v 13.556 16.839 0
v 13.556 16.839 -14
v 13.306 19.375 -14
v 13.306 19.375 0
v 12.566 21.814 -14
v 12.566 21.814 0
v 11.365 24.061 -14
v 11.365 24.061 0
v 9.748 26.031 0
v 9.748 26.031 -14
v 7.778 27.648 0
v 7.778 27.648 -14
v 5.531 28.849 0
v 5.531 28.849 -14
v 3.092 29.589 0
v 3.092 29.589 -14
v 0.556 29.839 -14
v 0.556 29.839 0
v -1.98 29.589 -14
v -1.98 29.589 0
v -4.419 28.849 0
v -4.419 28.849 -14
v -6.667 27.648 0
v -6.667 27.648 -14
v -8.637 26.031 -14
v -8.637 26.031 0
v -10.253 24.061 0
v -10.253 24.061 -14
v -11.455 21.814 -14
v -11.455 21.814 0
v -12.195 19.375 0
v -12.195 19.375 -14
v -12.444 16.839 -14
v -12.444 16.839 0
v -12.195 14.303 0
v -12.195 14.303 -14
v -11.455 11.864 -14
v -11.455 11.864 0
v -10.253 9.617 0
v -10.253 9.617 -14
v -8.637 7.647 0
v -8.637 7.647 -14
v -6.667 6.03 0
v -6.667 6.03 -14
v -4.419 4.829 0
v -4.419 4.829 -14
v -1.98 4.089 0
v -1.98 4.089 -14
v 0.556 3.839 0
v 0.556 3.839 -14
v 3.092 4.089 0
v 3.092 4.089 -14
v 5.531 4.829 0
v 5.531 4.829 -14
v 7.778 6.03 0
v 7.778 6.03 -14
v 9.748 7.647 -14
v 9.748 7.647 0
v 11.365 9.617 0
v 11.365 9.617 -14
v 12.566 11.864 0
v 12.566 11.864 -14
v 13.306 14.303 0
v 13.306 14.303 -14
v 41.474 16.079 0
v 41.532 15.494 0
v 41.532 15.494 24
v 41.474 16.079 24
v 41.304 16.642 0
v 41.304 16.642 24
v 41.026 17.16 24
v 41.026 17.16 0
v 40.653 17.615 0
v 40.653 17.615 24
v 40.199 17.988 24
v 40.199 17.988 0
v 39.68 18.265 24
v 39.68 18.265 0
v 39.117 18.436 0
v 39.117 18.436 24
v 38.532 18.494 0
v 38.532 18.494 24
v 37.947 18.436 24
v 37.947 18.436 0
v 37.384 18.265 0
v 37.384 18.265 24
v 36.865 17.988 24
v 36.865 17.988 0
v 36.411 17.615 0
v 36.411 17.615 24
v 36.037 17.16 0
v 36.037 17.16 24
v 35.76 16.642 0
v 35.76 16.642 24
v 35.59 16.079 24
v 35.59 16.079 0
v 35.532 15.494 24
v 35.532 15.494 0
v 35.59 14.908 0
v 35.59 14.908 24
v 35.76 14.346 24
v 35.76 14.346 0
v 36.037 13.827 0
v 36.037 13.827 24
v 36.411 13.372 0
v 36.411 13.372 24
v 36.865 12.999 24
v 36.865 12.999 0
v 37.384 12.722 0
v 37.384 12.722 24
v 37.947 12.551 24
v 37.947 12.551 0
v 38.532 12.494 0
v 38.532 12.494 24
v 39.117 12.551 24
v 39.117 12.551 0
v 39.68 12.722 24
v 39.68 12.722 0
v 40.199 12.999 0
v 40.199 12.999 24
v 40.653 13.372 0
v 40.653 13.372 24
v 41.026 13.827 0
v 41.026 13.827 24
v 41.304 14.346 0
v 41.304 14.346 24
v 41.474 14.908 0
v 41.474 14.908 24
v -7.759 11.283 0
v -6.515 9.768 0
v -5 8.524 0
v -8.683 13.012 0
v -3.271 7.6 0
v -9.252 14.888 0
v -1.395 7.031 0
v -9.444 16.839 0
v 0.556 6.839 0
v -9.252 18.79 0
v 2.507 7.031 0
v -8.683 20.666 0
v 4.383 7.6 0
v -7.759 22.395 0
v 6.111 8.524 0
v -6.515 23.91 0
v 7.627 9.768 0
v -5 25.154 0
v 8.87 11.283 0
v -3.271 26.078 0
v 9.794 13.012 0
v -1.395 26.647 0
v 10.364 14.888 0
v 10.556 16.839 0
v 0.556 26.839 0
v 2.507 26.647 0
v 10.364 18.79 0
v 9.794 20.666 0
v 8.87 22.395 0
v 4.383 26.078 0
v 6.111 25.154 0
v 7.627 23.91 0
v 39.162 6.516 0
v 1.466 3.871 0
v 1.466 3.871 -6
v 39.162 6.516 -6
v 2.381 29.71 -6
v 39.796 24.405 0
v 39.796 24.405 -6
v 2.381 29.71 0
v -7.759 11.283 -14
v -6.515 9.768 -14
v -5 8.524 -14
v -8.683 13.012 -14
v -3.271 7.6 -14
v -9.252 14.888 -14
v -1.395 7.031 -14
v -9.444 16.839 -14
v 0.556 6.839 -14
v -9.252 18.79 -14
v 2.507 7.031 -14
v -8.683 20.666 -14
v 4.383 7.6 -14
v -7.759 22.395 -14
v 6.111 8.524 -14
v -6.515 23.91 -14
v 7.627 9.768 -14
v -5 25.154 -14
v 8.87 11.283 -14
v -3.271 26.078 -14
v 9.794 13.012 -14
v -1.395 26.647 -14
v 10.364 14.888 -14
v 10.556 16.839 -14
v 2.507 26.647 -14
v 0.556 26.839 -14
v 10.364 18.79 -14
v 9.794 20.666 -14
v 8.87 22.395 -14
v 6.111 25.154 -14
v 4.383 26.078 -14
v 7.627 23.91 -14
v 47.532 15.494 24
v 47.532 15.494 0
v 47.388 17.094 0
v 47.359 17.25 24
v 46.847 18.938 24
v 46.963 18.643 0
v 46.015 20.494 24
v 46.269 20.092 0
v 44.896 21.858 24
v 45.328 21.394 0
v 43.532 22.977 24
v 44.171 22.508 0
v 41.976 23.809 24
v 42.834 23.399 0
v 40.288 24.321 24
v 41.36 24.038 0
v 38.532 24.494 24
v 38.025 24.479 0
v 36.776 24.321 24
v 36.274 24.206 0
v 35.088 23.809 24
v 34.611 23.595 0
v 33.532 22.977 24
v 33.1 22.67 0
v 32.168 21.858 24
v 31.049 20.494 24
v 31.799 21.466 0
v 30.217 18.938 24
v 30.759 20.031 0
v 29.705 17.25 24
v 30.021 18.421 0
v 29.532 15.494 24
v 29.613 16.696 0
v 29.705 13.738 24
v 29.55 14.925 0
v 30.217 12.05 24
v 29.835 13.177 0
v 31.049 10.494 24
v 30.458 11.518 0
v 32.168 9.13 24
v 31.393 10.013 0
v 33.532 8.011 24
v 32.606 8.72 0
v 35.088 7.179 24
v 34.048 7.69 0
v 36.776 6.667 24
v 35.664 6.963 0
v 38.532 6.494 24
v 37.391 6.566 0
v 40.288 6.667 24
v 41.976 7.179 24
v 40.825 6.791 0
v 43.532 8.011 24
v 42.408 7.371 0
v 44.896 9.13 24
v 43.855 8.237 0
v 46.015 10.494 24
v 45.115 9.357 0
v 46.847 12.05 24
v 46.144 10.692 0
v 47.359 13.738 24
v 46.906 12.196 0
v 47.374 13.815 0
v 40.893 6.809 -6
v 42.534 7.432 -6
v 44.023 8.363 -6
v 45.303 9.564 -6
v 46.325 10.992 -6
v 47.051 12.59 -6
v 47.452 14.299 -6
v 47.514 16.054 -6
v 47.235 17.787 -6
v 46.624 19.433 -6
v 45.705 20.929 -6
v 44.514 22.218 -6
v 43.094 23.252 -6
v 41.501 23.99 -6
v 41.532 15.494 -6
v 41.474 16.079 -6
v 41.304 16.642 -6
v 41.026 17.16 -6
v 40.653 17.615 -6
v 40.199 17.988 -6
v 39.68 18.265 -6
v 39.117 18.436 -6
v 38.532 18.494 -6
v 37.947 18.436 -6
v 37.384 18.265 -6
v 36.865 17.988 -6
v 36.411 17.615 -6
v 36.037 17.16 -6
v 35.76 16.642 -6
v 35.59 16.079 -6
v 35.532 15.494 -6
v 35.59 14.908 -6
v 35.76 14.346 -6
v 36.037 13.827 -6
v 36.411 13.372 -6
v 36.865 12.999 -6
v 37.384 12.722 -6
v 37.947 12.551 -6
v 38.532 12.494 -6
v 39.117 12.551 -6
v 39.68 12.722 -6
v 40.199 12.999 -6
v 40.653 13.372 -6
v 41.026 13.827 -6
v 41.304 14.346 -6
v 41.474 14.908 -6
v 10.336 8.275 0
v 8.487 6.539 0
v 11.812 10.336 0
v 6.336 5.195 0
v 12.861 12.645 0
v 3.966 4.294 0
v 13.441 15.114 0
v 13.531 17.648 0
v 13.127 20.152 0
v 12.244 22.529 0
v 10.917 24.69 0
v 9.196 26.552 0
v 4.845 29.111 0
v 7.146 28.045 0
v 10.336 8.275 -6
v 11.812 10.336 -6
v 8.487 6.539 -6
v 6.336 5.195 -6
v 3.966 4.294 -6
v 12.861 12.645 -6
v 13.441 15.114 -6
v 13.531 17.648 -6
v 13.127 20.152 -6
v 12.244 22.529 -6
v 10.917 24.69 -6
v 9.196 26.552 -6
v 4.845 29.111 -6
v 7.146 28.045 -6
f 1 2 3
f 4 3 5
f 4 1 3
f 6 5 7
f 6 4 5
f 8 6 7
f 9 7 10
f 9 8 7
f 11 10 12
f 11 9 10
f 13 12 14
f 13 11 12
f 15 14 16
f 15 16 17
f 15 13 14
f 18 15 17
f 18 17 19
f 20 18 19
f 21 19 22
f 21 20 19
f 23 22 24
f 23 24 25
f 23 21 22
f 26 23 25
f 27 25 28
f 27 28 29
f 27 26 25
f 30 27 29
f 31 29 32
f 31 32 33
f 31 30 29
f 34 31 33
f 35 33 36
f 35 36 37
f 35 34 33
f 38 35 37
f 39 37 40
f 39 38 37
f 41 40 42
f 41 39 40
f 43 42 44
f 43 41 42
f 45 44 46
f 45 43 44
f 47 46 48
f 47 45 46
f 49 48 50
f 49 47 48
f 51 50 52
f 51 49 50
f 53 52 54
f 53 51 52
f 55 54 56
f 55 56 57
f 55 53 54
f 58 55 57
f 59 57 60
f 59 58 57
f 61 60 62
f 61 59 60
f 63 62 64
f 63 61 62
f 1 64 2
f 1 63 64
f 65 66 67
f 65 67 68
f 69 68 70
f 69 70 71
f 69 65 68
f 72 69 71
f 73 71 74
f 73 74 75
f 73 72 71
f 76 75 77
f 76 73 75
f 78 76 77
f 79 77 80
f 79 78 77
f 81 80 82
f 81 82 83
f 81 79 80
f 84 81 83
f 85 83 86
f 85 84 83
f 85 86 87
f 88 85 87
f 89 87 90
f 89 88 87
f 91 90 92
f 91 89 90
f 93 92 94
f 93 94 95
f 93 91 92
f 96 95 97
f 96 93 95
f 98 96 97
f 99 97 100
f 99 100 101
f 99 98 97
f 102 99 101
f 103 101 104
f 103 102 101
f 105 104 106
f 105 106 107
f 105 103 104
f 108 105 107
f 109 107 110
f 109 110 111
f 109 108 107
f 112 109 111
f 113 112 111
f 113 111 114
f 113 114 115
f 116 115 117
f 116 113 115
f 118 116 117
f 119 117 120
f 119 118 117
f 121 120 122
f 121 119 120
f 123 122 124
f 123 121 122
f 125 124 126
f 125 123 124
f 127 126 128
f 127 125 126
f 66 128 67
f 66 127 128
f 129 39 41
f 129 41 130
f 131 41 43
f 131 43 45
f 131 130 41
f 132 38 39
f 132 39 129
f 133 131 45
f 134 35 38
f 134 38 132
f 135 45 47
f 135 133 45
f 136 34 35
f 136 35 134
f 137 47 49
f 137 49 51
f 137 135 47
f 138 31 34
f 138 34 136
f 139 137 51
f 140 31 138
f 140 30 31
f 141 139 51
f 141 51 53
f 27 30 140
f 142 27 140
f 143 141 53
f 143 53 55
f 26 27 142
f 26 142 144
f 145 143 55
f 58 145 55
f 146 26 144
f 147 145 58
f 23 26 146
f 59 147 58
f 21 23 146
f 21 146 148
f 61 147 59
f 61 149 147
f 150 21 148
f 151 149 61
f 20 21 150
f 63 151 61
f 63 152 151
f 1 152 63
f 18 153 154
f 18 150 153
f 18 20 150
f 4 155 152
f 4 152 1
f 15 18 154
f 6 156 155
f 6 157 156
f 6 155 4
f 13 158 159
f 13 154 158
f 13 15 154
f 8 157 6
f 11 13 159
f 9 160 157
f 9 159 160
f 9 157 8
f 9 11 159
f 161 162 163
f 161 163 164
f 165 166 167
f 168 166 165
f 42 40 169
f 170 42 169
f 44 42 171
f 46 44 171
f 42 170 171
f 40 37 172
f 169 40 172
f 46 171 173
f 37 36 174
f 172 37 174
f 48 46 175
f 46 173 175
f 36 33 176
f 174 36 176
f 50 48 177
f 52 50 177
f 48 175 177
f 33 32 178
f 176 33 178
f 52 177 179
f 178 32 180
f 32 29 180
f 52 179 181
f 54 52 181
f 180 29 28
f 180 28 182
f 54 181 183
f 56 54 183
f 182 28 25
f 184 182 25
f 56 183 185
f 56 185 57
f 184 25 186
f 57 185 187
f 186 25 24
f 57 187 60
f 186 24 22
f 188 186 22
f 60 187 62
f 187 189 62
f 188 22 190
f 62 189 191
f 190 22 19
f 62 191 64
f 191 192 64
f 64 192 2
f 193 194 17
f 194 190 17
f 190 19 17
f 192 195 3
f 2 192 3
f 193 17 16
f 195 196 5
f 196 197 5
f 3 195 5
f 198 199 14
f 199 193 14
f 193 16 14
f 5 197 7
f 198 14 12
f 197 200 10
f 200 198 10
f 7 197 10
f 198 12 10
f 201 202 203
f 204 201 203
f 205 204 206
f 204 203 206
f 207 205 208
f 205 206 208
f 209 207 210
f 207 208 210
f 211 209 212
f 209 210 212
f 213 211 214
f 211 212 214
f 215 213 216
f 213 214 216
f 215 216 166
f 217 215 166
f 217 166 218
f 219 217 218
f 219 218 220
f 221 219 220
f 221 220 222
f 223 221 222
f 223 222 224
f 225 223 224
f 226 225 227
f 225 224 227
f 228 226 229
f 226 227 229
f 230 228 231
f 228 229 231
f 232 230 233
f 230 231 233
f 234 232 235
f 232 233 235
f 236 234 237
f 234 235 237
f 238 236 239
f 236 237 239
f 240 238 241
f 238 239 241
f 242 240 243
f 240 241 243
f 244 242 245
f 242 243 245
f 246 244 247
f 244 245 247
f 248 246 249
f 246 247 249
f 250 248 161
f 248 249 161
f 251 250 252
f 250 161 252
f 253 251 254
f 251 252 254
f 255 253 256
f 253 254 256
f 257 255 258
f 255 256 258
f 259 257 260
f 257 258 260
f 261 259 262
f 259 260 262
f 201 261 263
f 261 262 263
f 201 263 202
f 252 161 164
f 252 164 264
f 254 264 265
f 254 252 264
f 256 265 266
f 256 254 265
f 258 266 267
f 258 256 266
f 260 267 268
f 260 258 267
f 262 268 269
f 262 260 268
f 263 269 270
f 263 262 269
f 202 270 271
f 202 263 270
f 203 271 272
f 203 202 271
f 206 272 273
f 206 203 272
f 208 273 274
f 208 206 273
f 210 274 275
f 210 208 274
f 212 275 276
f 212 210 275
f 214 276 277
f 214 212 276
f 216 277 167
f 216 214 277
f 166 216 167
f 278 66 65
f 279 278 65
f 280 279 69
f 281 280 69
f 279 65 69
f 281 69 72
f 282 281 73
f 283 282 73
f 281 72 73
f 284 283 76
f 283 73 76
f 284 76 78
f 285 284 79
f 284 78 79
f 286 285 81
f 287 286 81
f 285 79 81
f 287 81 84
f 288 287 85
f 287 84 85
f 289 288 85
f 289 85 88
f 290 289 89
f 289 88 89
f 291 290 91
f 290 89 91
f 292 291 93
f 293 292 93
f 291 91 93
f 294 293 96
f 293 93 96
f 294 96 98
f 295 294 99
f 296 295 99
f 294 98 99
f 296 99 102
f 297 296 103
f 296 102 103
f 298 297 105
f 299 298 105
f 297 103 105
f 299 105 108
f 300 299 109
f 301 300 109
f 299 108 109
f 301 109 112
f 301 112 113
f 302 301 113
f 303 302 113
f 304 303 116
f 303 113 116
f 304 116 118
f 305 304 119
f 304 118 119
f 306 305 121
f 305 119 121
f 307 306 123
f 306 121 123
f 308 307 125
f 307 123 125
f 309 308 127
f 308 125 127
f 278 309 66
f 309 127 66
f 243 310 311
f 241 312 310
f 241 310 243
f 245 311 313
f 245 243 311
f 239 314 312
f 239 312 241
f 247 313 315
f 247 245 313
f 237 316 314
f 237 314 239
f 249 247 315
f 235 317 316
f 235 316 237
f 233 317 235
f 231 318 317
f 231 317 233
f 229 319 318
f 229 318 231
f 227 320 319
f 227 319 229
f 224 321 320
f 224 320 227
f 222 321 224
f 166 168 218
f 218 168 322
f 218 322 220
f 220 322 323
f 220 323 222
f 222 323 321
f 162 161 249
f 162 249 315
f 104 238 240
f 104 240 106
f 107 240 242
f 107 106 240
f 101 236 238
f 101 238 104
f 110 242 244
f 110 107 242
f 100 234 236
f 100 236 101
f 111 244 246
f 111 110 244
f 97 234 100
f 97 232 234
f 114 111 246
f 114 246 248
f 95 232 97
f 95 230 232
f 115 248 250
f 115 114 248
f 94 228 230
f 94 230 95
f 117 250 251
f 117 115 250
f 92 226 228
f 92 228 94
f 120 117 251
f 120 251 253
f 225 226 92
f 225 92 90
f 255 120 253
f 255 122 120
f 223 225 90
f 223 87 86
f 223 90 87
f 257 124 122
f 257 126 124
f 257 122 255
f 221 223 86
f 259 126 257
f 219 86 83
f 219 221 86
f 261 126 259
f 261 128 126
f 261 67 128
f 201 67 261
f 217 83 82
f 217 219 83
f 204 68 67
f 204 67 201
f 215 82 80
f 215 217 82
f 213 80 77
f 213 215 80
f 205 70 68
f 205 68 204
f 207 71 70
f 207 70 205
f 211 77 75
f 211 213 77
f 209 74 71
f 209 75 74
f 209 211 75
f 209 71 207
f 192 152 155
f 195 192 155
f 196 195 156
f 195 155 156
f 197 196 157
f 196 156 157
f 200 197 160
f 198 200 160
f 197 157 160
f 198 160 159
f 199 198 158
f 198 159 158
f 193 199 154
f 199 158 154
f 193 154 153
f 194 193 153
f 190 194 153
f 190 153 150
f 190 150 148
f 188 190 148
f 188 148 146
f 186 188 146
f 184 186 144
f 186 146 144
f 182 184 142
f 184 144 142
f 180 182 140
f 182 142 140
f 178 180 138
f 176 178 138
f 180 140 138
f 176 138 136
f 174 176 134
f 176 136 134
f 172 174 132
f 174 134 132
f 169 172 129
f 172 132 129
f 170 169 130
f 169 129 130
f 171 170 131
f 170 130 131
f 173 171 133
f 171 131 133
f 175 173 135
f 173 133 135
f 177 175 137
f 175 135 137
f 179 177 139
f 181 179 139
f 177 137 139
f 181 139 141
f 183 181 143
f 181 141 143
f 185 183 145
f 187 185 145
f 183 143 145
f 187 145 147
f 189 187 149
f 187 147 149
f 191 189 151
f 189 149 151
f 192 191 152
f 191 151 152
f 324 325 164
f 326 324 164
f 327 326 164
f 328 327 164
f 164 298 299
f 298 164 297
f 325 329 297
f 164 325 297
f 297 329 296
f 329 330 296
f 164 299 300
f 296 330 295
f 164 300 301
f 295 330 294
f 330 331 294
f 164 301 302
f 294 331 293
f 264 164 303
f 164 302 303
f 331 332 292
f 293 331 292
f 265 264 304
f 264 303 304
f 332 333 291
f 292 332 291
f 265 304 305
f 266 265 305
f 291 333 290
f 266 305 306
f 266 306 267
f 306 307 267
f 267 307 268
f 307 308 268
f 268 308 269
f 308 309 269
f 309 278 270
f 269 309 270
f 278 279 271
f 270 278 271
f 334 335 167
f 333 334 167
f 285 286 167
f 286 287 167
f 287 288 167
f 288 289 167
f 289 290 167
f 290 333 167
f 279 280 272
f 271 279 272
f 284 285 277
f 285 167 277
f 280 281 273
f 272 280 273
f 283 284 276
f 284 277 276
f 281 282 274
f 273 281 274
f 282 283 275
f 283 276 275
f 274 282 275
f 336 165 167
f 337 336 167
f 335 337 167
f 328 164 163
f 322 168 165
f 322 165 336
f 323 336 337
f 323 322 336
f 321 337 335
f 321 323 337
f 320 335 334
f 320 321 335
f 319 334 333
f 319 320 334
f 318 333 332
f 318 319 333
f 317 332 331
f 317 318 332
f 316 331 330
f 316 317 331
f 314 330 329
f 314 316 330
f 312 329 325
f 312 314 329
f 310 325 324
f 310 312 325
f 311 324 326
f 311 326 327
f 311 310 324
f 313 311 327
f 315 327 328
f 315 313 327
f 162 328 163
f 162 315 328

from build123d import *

# Parameters (mm, degrees)
CROQUIS1_R              = 3
SALIENTE_EXTRUIR1_DEPTH = 24
CROQUIS1_4_R            = 10
SALIENTE_EXTRUIR2_DEPTH = 14
SALIENTE_EXTRUIR5_START = -6
CROQUIS1_11_R           = 3
SALIENTE_EXTRUIR5_DEPTH = 6


with BuildPart() as part:
    # Croquis1 → Saliente-Extruir1 (new body)
    with BuildSketch(Plane.XY):
        with BuildLine():
            ThreePointArc((47.531883149, 15.493750807), (45.327935293, 21.394062261), (39.79551087, 24.404600653))
            ThreePointArc((39.79551087, 24.404600653), (29.537524962, 15.812374125), (39.161804519, 6.515822367))
            ThreePointArc((39.161804519, 6.515822367), (45.114788751, 9.356540216), (47.531883149, 15.493750807))
        make_face()
        with Locations((38.531883149, 15.493750807)):
            Circle(CROQUIS1_R, mode=Mode.SUBTRACT)
    extrude(amount=SALIENTE_EXTRUIR1_DEPTH)

    # Croquis1<11> → Saliente-Extruir5 (add)
    with BuildSketch(Plane.XY.offset(SALIENTE_EXTRUIR5_START)):
        with BuildLine():
            Line((39.79551087, 24.404600653), (2.380944182, 29.710276818))
            ThreePointArc((2.380944182, 29.710276818), (13.547554854, 16.37881558), (1.465590565, 3.870930405))
            Line((1.465590565, 3.870930405), (39.161804519, 6.515822367))
            ThreePointArc((39.161804519, 6.515822367), (47.526241335, 15.175127489), (39.79551087, 24.404600653))
        make_face()
        with Locations((38.531883149, 15.493750807)):
            Circle(CROQUIS1_11_R, mode=Mode.SUBTRACT)
    extrude(amount=SALIENTE_EXTRUIR5_DEPTH)


with BuildPart() as body_2:
    # Croquis1<4> → Saliente-Extruir2 (new body)
    with BuildSketch(Plane.XY):
        with BuildLine():
            ThreePointArc((13.55570414, 16.839049262), (10.372223904, 25.361721363), (2.380944182, 29.710276818))
            ThreePointArc((2.380944182, 29.710276818), (-12.436146573, 17.299282944), (1.465590565, 3.870930405))
            ThreePointArc((1.465590565, 3.870930405), (10.064345566, 7.974189521), (13.55570414, 16.839049262))
        make_face()
        with Locations((0.55570414, 16.839049262)):
            Circle(CROQUIS1_4_R, mode=Mode.SUBTRACT)
    extrude(amount=-SALIENTE_EXTRUIR2_DEPTH)


solid = Compound([part.part, body_2.part])
